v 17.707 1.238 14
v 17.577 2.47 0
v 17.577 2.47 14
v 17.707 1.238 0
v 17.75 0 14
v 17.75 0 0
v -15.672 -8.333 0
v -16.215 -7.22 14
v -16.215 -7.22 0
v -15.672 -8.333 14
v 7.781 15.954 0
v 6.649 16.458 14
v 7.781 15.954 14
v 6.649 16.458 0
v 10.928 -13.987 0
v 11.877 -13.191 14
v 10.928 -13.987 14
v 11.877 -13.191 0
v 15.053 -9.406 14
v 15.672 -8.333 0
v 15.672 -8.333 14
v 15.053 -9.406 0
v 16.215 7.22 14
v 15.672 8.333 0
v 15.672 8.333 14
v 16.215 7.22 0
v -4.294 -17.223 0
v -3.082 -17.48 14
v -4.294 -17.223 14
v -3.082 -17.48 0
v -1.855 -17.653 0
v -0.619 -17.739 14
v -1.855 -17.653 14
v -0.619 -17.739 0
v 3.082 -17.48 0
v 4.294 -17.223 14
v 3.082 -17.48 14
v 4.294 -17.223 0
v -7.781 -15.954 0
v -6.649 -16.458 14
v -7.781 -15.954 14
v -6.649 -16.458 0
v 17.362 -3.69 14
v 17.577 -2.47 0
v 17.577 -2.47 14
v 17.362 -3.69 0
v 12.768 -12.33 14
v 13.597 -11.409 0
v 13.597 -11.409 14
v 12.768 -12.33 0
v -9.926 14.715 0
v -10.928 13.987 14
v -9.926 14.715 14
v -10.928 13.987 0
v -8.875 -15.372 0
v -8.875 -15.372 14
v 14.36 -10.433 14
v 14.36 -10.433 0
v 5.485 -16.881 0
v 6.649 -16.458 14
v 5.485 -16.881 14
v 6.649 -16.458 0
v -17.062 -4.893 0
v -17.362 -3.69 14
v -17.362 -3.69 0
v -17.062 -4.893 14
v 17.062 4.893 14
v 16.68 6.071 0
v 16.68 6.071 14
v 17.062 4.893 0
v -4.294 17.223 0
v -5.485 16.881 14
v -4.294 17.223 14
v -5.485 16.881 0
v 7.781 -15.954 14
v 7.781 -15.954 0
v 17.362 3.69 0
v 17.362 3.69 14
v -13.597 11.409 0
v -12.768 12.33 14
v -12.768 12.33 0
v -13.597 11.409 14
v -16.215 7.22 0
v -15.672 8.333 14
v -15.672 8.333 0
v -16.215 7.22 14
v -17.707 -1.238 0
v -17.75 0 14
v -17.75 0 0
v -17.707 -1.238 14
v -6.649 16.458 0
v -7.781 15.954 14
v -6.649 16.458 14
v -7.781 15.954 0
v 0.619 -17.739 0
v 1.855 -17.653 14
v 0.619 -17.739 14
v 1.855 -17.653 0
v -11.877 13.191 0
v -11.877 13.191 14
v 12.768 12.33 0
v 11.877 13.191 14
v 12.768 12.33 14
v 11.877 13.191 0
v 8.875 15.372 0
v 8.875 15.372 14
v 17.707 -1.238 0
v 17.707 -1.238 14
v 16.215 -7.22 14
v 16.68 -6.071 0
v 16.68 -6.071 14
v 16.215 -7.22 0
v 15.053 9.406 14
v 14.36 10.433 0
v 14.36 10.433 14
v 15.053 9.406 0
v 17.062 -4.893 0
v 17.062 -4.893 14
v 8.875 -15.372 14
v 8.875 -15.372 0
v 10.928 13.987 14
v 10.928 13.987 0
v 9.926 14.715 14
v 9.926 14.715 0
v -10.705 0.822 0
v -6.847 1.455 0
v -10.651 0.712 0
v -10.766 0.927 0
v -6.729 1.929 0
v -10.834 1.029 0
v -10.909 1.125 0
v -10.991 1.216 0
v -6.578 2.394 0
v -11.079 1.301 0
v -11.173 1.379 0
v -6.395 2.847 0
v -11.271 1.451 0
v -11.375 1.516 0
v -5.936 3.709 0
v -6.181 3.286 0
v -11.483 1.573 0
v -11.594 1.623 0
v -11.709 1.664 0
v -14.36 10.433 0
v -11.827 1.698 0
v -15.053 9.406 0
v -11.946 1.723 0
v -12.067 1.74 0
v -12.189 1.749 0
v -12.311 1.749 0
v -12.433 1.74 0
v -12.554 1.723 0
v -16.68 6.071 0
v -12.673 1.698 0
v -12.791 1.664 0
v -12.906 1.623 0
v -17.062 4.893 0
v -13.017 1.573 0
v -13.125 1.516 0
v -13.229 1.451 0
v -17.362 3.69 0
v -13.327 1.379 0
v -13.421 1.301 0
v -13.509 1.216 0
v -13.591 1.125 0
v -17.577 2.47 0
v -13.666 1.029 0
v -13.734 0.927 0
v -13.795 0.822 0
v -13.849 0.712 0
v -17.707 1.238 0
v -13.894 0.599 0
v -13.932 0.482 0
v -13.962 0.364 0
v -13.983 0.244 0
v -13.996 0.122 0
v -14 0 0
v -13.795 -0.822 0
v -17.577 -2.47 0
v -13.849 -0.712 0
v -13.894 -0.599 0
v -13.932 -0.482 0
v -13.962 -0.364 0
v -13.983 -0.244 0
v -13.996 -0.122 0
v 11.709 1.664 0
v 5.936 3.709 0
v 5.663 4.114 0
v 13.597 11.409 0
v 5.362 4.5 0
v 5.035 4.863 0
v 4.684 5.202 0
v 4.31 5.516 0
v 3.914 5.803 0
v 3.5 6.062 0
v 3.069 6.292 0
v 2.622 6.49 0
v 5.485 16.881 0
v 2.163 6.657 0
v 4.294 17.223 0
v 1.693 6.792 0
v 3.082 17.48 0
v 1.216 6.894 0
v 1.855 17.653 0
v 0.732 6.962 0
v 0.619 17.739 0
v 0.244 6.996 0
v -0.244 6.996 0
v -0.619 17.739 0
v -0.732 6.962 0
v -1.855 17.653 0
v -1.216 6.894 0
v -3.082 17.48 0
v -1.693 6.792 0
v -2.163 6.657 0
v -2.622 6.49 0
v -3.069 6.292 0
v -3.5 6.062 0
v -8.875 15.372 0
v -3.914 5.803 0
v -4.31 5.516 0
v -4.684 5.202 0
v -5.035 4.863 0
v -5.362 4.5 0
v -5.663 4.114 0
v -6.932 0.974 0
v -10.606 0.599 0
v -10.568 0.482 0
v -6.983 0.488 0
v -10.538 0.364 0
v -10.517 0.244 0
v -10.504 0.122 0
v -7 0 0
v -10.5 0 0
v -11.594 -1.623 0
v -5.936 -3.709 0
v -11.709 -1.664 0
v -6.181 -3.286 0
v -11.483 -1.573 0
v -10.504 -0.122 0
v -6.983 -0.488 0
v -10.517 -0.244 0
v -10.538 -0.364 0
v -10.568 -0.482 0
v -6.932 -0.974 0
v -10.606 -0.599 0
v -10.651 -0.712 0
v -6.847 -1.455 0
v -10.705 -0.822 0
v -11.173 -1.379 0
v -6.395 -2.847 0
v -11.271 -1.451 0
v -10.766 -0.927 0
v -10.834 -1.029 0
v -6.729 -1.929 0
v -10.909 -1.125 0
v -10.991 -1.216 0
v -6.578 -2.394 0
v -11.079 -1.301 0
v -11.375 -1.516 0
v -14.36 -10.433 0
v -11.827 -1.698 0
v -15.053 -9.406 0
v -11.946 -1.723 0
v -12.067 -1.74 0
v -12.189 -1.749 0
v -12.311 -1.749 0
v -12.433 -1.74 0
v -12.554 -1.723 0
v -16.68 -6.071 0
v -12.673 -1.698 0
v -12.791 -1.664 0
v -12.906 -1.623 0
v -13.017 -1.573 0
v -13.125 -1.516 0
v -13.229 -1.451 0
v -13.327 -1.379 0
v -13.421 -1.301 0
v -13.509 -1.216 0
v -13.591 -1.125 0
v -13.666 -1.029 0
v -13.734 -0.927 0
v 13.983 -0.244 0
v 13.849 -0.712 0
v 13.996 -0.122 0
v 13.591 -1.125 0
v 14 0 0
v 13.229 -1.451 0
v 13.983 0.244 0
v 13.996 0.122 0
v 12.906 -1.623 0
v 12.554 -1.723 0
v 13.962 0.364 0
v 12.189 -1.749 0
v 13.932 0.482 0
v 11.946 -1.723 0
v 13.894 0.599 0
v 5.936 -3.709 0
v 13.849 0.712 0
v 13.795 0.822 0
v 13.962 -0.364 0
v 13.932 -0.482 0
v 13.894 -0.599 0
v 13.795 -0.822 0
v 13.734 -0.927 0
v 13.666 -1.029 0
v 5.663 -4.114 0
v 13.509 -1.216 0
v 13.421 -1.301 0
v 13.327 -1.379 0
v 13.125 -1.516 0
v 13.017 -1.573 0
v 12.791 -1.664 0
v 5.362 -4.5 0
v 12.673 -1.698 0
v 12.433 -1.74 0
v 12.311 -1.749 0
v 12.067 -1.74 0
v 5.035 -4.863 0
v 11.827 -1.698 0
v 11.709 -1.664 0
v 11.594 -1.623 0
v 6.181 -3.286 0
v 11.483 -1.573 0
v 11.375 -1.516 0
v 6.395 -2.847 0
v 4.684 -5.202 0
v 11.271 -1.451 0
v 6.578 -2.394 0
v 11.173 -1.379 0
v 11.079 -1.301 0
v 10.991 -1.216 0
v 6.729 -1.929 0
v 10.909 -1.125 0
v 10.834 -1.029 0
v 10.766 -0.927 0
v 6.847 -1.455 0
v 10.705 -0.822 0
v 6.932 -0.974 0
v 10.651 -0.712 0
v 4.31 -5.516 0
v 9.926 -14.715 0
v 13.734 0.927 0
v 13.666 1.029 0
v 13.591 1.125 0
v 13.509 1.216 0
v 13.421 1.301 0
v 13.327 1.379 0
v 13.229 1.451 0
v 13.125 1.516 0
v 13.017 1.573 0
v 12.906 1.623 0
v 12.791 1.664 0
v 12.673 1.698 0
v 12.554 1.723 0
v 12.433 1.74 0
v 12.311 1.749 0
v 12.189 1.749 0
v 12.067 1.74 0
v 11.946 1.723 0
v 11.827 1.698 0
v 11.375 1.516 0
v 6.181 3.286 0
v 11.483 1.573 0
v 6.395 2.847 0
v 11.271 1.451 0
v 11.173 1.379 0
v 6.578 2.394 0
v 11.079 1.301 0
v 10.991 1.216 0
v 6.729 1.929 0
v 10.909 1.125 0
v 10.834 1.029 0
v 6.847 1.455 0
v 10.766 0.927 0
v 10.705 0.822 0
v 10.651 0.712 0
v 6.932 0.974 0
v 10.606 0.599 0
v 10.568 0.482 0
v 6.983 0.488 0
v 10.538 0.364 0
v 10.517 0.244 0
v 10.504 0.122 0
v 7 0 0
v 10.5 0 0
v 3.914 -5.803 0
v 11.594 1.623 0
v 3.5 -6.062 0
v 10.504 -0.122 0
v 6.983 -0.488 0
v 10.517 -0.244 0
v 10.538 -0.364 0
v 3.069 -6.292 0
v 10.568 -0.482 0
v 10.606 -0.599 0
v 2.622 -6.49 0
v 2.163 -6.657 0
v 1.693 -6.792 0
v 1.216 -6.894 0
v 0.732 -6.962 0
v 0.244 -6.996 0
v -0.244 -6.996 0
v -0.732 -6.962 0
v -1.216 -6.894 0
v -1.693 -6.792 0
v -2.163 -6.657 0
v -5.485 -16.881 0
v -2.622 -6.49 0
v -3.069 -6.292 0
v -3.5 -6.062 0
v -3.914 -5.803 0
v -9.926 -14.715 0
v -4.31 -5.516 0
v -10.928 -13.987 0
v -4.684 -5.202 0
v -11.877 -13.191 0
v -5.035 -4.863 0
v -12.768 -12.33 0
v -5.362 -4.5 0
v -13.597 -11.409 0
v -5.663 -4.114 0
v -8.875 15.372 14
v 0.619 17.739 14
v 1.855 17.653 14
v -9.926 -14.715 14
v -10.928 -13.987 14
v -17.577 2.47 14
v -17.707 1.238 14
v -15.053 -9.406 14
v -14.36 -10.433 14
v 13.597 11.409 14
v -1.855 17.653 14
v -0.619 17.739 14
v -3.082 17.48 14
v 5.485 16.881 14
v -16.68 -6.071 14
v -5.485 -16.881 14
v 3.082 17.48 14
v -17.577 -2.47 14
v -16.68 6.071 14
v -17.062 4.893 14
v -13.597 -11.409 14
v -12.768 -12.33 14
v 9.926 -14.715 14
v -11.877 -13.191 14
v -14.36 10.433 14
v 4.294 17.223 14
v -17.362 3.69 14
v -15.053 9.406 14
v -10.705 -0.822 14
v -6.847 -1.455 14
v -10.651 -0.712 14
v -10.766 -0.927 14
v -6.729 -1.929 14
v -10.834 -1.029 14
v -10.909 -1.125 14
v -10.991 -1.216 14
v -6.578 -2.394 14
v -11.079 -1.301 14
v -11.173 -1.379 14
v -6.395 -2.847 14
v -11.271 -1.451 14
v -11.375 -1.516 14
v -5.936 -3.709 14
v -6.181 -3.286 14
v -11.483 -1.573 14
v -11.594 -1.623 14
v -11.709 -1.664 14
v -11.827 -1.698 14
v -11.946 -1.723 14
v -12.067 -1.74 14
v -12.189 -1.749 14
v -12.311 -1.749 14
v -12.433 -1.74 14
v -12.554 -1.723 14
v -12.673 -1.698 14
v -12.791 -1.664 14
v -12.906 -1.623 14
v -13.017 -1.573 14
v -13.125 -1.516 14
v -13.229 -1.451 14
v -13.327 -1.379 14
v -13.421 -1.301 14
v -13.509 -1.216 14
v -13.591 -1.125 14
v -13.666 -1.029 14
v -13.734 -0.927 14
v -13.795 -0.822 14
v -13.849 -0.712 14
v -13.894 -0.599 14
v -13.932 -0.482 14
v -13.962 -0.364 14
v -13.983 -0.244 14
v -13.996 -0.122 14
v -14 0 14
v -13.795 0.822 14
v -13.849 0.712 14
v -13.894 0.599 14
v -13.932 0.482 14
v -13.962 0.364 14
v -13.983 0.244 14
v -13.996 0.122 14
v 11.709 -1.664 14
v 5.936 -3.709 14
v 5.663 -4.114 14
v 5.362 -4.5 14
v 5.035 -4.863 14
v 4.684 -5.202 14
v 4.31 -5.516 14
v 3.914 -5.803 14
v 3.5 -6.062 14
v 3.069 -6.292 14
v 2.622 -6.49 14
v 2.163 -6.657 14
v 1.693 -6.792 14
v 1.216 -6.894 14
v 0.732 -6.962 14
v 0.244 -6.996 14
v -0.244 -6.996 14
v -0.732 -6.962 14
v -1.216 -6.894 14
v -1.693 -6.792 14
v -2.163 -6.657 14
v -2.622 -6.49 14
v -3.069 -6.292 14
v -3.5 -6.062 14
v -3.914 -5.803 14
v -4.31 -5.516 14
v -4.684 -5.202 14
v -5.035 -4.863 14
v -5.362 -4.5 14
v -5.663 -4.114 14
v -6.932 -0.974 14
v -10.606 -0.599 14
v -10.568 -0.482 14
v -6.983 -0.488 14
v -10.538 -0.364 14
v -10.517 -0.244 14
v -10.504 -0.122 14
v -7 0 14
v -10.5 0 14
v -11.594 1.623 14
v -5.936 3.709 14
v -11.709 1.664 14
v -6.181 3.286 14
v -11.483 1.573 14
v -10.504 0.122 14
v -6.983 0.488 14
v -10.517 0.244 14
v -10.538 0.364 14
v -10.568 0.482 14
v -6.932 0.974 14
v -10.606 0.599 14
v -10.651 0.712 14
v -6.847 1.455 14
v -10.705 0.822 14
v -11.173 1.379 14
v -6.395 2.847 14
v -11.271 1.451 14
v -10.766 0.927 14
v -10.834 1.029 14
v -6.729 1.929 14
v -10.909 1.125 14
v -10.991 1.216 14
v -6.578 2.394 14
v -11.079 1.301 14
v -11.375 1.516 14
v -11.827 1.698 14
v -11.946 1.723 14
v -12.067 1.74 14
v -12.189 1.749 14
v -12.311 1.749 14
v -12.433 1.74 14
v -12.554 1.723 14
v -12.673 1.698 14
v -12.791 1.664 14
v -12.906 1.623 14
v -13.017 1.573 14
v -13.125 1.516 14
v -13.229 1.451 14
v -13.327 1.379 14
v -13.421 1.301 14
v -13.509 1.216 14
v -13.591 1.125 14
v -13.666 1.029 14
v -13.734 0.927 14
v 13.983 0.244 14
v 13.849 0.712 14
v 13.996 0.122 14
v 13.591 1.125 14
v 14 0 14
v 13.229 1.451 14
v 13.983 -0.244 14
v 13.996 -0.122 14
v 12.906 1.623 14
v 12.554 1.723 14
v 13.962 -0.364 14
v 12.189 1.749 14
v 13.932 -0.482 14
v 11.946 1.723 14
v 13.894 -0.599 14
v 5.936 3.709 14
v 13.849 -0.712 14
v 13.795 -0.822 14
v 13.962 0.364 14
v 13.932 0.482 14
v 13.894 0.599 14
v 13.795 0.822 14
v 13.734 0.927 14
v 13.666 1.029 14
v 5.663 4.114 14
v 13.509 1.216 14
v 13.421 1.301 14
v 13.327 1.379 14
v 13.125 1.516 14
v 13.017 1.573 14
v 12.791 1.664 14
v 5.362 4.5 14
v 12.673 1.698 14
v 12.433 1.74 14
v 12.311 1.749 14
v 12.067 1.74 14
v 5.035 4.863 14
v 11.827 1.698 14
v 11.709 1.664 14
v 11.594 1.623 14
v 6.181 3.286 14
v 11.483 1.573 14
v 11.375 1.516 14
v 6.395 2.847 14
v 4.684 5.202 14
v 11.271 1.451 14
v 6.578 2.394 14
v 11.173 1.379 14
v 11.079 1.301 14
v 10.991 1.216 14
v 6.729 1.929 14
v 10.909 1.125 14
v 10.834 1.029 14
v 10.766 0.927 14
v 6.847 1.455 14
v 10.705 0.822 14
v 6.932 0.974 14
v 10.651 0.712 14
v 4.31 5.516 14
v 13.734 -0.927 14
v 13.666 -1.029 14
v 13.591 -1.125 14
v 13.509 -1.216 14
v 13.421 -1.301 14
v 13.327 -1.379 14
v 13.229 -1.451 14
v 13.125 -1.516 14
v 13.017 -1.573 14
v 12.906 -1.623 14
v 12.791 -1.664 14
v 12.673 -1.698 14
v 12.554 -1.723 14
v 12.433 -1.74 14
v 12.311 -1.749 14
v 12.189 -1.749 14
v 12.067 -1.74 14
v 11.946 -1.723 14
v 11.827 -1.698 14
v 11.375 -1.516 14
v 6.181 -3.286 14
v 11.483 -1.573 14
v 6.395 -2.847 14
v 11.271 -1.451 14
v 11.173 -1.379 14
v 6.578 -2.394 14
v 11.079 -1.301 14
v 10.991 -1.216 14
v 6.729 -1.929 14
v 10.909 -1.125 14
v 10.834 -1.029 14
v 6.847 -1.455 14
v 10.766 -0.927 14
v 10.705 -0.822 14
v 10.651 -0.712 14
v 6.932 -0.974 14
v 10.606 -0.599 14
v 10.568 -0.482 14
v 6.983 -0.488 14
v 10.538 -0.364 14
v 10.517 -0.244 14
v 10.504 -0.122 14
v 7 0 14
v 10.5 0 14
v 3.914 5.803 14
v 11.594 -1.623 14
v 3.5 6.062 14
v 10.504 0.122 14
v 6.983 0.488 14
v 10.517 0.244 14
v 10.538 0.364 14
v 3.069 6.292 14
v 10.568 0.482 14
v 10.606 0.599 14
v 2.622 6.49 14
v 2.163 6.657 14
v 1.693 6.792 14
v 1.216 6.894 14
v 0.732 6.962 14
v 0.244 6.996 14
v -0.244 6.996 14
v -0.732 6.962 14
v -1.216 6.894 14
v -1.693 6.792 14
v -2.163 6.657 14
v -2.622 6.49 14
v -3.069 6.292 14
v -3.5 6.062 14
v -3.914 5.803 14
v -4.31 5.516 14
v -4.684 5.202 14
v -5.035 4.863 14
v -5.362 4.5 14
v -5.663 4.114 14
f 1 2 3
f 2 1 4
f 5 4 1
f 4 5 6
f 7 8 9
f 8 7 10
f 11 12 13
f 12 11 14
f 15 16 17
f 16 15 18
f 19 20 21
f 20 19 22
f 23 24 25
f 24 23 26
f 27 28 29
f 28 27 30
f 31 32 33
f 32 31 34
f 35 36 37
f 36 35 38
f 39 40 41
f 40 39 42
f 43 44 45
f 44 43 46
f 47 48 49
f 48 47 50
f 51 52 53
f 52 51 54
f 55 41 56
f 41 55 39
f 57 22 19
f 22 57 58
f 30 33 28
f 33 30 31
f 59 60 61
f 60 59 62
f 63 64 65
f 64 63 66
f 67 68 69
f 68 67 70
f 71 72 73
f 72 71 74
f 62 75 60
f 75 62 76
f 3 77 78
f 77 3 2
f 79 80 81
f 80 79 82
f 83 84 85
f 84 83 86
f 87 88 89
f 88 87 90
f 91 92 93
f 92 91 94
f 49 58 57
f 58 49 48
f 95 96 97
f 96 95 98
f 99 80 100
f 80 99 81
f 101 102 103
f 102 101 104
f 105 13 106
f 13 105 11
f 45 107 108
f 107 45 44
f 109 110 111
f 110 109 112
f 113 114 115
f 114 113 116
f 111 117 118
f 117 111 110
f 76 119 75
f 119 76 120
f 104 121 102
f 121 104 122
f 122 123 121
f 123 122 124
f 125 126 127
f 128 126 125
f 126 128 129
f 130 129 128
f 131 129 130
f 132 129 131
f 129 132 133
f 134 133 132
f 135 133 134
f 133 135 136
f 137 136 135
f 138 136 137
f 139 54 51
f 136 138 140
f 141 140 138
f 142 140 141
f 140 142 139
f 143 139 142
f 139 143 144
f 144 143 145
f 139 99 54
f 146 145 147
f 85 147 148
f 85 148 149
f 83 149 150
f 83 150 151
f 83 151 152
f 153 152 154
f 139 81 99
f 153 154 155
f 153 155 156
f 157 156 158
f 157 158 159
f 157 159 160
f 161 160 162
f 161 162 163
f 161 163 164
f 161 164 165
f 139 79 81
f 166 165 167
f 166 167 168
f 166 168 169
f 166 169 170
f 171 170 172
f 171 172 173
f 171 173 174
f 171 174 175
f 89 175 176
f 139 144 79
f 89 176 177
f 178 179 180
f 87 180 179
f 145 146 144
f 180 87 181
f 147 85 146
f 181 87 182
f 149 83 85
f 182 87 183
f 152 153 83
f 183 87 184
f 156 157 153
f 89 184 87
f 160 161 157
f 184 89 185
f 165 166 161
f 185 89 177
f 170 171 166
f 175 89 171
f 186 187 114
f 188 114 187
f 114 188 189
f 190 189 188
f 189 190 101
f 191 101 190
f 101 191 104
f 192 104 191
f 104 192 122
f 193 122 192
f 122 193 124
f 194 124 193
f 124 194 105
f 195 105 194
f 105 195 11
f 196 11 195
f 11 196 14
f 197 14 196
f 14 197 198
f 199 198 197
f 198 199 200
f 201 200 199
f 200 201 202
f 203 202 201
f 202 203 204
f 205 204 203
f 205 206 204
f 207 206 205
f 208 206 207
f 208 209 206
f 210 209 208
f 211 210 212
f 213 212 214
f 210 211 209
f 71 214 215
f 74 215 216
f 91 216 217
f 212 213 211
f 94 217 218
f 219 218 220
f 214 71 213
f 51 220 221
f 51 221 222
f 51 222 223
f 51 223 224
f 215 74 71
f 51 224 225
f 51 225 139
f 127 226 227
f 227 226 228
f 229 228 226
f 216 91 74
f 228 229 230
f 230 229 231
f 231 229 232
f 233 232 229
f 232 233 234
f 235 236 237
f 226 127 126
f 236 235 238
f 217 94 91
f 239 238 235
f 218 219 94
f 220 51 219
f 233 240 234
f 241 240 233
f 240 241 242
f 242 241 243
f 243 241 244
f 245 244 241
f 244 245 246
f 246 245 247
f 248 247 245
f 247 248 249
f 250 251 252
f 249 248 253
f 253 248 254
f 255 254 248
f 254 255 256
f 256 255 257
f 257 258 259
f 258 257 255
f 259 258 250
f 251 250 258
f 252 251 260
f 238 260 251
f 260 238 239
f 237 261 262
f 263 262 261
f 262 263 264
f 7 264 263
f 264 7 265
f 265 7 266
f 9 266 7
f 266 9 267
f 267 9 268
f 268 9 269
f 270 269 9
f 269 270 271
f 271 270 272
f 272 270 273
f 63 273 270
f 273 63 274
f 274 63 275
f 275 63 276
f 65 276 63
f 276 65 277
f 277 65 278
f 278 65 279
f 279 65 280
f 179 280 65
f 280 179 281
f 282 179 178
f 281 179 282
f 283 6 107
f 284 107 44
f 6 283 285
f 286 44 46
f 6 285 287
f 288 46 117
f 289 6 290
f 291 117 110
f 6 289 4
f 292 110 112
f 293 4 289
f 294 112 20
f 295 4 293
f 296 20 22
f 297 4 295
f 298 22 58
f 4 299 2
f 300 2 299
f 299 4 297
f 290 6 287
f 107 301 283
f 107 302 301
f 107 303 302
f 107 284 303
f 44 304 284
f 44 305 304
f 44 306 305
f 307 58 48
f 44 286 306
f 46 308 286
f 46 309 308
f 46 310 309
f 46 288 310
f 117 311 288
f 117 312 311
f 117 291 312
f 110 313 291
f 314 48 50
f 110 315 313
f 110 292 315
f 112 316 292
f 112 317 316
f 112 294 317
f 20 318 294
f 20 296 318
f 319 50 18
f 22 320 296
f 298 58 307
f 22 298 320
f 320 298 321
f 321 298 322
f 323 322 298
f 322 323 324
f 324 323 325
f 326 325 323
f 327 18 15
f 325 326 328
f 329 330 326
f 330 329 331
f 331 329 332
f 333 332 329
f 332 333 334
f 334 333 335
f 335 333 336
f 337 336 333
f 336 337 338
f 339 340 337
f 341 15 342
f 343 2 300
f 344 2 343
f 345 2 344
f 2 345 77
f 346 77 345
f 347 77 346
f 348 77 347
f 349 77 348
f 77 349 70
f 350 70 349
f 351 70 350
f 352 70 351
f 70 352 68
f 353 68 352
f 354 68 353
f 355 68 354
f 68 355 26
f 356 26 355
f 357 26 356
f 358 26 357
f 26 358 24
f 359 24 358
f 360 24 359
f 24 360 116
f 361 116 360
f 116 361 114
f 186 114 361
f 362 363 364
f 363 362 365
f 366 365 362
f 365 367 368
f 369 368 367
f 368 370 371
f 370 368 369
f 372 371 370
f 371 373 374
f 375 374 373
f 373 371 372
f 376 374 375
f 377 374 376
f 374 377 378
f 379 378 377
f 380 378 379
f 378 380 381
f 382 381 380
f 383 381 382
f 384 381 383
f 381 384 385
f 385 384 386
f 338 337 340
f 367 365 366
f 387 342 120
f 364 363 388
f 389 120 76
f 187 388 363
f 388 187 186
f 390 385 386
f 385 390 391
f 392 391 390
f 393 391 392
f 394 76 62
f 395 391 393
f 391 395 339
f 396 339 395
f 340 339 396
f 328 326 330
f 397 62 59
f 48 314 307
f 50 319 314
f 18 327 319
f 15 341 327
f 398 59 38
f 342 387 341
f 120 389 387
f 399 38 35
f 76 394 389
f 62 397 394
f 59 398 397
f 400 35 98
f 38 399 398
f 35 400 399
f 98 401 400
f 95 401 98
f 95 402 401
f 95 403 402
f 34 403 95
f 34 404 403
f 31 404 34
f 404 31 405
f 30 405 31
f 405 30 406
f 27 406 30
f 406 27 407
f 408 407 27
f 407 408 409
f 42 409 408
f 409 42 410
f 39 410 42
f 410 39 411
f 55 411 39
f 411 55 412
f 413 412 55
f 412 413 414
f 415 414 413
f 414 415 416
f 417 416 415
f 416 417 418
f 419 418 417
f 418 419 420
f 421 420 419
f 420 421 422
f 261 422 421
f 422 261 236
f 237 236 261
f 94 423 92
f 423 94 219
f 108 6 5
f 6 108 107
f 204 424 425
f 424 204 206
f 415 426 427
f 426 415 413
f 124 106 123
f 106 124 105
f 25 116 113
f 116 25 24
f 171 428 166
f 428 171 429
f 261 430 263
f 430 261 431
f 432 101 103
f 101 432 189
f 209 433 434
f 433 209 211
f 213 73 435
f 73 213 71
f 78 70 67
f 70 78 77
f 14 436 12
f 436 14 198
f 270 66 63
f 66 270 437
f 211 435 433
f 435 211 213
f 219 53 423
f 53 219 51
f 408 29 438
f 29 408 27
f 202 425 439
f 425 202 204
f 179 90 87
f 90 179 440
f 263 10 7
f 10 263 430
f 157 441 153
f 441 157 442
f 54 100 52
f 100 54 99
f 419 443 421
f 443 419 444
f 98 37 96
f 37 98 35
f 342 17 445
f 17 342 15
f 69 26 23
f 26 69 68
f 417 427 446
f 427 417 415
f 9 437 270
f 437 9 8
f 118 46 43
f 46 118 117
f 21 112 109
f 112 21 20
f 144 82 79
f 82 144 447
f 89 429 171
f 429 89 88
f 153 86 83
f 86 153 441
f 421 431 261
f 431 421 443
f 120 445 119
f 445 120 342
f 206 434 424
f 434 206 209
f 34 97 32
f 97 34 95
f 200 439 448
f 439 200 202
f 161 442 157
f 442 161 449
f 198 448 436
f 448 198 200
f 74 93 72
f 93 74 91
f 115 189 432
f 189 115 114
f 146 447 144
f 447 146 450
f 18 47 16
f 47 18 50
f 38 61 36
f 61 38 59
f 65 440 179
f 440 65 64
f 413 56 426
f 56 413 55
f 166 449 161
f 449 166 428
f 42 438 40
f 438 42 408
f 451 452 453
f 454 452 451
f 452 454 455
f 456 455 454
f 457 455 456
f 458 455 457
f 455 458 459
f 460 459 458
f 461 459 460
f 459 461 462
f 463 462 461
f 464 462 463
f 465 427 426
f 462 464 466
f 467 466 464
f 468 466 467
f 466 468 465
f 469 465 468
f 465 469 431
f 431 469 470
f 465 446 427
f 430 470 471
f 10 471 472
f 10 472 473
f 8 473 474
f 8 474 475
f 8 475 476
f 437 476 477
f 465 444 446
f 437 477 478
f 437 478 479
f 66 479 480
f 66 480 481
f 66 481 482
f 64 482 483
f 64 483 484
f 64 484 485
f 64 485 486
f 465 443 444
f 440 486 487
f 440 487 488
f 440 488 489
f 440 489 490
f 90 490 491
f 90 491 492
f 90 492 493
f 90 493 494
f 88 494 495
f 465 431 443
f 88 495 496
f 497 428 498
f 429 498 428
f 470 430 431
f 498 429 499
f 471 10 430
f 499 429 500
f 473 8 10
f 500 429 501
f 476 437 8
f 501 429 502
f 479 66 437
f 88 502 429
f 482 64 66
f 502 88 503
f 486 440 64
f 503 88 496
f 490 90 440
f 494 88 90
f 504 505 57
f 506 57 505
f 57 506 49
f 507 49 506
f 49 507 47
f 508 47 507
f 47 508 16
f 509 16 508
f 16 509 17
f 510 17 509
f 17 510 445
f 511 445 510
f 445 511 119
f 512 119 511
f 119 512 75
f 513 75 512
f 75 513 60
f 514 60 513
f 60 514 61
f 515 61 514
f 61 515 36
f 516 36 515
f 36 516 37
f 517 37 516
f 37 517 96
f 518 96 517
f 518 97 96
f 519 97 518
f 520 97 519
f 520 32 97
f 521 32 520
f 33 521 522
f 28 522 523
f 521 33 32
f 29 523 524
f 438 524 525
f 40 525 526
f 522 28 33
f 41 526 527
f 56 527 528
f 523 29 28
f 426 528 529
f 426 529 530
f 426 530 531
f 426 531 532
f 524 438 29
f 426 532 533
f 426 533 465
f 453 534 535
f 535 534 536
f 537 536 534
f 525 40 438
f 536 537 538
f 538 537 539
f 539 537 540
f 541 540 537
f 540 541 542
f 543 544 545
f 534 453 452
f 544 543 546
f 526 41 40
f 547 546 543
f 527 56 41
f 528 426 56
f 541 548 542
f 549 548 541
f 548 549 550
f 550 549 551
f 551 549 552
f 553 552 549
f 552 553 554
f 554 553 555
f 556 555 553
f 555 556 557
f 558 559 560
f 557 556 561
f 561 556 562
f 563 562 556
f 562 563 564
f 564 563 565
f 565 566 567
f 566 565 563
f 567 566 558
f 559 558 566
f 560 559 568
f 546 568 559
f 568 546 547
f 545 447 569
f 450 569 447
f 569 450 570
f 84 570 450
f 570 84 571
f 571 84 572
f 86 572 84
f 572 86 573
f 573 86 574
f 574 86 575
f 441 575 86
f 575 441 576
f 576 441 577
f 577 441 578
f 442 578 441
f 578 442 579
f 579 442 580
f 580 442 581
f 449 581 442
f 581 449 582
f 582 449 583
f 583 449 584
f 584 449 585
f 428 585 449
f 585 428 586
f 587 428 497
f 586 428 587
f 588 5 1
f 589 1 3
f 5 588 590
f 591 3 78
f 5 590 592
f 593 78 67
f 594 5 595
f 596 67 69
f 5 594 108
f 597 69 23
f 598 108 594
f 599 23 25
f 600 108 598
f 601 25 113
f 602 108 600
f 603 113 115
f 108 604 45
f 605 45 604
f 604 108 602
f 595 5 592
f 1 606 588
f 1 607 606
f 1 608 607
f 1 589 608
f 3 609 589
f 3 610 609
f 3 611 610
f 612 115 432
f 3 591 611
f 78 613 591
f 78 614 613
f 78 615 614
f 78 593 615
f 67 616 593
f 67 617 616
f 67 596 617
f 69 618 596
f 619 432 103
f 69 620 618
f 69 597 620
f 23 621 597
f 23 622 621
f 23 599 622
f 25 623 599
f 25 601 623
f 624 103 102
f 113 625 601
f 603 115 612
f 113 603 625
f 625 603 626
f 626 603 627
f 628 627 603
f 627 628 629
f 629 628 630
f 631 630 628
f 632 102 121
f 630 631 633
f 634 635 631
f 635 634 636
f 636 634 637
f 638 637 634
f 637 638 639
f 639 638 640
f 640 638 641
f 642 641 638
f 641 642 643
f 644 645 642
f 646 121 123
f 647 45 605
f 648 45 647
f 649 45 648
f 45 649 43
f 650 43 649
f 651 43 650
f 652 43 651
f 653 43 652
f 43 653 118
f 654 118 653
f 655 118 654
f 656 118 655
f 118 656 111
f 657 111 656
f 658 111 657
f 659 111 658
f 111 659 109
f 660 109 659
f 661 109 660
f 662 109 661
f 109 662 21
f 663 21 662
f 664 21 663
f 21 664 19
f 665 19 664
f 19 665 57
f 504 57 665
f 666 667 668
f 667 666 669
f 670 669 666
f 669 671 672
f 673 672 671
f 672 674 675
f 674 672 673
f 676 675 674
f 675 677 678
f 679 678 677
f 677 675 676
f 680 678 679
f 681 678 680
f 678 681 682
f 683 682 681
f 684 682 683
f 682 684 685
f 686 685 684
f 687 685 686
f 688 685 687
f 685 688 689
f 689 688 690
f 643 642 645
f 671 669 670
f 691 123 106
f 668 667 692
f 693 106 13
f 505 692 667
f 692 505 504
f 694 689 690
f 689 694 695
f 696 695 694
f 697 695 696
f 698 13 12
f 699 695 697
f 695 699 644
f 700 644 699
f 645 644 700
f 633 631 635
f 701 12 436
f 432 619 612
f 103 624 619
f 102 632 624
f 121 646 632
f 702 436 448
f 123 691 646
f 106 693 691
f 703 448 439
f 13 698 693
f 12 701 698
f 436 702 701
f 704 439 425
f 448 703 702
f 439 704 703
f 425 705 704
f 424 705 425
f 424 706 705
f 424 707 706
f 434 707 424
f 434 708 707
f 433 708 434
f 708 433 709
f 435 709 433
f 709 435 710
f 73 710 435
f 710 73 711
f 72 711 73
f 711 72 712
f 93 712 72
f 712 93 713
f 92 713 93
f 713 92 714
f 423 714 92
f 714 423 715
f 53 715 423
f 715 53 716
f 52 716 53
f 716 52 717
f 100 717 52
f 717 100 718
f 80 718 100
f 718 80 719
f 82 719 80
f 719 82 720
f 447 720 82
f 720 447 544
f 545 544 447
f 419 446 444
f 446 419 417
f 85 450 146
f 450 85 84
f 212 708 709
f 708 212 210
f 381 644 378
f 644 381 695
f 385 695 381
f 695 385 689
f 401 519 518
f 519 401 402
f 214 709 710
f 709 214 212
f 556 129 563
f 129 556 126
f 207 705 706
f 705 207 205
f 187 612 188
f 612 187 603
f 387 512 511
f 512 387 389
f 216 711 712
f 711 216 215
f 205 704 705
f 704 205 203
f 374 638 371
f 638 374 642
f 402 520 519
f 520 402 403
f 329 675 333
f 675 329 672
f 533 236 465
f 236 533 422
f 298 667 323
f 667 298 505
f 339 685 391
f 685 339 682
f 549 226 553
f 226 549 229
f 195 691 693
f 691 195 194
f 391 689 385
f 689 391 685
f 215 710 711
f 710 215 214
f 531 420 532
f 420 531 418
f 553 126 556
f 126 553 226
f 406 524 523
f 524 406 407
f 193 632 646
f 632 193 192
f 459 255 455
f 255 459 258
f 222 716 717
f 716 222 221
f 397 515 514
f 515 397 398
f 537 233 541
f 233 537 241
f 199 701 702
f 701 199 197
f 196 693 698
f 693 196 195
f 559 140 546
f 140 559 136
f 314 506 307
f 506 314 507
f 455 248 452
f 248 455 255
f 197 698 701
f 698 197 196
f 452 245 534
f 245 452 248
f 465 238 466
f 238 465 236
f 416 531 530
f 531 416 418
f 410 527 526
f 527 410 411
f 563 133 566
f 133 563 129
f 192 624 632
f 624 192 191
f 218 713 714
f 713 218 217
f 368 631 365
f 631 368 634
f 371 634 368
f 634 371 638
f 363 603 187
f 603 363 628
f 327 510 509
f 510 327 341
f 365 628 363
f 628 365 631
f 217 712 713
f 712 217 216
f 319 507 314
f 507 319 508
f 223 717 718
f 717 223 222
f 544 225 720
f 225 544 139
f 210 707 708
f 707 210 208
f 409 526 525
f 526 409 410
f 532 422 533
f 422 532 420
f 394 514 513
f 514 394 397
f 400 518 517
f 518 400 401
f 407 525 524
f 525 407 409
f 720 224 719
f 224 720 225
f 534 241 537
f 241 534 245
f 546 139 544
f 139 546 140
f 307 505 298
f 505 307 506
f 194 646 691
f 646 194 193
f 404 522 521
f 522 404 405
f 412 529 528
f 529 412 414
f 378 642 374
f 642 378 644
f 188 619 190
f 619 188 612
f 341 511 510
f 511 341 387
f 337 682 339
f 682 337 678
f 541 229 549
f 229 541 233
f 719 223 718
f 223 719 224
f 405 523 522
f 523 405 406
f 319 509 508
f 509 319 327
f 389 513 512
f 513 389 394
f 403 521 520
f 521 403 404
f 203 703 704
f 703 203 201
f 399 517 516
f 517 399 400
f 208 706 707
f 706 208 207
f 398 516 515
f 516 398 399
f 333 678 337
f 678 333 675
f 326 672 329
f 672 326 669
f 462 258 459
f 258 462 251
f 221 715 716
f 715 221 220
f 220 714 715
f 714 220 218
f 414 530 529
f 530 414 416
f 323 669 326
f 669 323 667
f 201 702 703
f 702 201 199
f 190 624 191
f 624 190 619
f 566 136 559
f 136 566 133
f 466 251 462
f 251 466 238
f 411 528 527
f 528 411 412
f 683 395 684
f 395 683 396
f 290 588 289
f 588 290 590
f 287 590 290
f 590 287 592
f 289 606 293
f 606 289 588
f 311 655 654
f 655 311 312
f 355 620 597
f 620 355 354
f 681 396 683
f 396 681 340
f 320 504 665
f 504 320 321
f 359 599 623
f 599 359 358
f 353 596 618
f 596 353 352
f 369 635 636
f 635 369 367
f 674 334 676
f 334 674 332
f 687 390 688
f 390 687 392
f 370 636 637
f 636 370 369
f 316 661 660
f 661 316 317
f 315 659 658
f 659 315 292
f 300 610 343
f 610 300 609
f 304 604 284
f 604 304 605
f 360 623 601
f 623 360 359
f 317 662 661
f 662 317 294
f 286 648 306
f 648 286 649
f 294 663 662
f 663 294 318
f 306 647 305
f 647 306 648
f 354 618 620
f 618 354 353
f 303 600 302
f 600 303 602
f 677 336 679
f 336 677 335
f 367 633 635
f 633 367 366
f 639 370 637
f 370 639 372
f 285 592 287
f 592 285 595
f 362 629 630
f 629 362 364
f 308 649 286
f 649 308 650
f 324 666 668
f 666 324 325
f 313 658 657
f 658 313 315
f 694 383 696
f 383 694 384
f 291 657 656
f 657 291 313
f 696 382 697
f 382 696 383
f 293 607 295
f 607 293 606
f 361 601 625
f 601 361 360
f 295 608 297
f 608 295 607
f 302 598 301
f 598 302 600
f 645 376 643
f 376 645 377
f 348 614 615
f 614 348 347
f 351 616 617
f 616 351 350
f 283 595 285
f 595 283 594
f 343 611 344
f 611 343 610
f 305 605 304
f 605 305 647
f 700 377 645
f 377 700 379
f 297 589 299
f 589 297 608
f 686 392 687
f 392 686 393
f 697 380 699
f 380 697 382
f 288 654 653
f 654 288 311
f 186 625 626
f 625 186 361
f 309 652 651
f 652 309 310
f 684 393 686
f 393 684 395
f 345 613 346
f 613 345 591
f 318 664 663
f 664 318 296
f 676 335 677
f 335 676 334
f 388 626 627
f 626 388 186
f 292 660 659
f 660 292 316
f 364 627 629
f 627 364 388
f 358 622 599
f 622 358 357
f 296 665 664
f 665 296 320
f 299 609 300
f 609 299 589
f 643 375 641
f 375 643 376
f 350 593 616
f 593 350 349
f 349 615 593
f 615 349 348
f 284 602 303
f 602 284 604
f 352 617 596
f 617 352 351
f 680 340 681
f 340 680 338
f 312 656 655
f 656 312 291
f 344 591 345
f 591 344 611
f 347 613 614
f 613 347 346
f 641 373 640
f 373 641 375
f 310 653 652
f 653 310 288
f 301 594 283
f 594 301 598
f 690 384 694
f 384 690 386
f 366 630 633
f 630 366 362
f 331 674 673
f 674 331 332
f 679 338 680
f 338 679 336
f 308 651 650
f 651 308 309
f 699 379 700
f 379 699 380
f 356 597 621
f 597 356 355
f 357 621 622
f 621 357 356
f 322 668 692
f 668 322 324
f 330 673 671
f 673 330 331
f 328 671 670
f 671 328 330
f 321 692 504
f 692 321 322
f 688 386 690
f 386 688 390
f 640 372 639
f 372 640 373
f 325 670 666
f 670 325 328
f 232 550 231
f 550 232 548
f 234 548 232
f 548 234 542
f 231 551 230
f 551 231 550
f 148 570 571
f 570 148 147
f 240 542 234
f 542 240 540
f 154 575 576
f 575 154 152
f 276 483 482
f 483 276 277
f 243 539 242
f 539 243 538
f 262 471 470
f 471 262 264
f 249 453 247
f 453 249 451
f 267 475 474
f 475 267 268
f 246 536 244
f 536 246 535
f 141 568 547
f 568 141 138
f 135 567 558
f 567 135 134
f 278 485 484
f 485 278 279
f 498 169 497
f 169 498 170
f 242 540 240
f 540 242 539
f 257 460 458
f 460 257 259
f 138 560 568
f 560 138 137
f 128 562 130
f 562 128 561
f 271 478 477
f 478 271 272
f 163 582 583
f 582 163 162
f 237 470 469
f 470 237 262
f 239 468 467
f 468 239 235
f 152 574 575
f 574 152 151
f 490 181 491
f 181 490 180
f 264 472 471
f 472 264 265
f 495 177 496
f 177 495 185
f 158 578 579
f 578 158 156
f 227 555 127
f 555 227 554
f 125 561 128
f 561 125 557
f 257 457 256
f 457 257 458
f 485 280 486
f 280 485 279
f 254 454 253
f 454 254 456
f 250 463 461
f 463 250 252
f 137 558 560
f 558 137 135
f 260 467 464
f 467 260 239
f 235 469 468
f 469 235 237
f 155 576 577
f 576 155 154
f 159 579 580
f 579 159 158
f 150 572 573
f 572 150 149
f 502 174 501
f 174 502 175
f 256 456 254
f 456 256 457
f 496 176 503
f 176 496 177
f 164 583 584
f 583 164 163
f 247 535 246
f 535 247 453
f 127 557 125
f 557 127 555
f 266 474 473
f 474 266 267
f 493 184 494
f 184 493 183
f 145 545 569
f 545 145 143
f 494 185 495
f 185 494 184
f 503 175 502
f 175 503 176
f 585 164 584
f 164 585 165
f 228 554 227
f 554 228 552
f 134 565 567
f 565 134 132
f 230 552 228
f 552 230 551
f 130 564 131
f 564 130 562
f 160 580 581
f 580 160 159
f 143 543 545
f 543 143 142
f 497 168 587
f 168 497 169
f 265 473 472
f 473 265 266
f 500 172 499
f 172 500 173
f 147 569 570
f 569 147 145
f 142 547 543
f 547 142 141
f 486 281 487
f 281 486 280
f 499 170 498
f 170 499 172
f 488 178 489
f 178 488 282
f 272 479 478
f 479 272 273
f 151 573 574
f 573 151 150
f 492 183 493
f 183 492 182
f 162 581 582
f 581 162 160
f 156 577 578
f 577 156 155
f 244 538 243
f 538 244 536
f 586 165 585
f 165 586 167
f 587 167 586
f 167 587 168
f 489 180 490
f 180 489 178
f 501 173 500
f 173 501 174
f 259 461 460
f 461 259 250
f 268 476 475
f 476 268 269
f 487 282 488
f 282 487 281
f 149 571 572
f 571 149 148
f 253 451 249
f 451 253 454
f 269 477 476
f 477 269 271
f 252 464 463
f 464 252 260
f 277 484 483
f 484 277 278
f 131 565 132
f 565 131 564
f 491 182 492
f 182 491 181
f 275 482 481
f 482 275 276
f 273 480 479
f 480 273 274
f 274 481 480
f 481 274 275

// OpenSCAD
$fn=90;

H = 14;
DELTA = 24.5;

difference() {
	cylinder(d=35.5, h=H);	
	cylinder(d=14.0, h=H);
	translate([ DELTA/2, 0, 0]) cylinder(d=3.5, h=H);
	translate([-DELTA/2, 0, 0]) cylinder(d=3.5, h=H);
}
